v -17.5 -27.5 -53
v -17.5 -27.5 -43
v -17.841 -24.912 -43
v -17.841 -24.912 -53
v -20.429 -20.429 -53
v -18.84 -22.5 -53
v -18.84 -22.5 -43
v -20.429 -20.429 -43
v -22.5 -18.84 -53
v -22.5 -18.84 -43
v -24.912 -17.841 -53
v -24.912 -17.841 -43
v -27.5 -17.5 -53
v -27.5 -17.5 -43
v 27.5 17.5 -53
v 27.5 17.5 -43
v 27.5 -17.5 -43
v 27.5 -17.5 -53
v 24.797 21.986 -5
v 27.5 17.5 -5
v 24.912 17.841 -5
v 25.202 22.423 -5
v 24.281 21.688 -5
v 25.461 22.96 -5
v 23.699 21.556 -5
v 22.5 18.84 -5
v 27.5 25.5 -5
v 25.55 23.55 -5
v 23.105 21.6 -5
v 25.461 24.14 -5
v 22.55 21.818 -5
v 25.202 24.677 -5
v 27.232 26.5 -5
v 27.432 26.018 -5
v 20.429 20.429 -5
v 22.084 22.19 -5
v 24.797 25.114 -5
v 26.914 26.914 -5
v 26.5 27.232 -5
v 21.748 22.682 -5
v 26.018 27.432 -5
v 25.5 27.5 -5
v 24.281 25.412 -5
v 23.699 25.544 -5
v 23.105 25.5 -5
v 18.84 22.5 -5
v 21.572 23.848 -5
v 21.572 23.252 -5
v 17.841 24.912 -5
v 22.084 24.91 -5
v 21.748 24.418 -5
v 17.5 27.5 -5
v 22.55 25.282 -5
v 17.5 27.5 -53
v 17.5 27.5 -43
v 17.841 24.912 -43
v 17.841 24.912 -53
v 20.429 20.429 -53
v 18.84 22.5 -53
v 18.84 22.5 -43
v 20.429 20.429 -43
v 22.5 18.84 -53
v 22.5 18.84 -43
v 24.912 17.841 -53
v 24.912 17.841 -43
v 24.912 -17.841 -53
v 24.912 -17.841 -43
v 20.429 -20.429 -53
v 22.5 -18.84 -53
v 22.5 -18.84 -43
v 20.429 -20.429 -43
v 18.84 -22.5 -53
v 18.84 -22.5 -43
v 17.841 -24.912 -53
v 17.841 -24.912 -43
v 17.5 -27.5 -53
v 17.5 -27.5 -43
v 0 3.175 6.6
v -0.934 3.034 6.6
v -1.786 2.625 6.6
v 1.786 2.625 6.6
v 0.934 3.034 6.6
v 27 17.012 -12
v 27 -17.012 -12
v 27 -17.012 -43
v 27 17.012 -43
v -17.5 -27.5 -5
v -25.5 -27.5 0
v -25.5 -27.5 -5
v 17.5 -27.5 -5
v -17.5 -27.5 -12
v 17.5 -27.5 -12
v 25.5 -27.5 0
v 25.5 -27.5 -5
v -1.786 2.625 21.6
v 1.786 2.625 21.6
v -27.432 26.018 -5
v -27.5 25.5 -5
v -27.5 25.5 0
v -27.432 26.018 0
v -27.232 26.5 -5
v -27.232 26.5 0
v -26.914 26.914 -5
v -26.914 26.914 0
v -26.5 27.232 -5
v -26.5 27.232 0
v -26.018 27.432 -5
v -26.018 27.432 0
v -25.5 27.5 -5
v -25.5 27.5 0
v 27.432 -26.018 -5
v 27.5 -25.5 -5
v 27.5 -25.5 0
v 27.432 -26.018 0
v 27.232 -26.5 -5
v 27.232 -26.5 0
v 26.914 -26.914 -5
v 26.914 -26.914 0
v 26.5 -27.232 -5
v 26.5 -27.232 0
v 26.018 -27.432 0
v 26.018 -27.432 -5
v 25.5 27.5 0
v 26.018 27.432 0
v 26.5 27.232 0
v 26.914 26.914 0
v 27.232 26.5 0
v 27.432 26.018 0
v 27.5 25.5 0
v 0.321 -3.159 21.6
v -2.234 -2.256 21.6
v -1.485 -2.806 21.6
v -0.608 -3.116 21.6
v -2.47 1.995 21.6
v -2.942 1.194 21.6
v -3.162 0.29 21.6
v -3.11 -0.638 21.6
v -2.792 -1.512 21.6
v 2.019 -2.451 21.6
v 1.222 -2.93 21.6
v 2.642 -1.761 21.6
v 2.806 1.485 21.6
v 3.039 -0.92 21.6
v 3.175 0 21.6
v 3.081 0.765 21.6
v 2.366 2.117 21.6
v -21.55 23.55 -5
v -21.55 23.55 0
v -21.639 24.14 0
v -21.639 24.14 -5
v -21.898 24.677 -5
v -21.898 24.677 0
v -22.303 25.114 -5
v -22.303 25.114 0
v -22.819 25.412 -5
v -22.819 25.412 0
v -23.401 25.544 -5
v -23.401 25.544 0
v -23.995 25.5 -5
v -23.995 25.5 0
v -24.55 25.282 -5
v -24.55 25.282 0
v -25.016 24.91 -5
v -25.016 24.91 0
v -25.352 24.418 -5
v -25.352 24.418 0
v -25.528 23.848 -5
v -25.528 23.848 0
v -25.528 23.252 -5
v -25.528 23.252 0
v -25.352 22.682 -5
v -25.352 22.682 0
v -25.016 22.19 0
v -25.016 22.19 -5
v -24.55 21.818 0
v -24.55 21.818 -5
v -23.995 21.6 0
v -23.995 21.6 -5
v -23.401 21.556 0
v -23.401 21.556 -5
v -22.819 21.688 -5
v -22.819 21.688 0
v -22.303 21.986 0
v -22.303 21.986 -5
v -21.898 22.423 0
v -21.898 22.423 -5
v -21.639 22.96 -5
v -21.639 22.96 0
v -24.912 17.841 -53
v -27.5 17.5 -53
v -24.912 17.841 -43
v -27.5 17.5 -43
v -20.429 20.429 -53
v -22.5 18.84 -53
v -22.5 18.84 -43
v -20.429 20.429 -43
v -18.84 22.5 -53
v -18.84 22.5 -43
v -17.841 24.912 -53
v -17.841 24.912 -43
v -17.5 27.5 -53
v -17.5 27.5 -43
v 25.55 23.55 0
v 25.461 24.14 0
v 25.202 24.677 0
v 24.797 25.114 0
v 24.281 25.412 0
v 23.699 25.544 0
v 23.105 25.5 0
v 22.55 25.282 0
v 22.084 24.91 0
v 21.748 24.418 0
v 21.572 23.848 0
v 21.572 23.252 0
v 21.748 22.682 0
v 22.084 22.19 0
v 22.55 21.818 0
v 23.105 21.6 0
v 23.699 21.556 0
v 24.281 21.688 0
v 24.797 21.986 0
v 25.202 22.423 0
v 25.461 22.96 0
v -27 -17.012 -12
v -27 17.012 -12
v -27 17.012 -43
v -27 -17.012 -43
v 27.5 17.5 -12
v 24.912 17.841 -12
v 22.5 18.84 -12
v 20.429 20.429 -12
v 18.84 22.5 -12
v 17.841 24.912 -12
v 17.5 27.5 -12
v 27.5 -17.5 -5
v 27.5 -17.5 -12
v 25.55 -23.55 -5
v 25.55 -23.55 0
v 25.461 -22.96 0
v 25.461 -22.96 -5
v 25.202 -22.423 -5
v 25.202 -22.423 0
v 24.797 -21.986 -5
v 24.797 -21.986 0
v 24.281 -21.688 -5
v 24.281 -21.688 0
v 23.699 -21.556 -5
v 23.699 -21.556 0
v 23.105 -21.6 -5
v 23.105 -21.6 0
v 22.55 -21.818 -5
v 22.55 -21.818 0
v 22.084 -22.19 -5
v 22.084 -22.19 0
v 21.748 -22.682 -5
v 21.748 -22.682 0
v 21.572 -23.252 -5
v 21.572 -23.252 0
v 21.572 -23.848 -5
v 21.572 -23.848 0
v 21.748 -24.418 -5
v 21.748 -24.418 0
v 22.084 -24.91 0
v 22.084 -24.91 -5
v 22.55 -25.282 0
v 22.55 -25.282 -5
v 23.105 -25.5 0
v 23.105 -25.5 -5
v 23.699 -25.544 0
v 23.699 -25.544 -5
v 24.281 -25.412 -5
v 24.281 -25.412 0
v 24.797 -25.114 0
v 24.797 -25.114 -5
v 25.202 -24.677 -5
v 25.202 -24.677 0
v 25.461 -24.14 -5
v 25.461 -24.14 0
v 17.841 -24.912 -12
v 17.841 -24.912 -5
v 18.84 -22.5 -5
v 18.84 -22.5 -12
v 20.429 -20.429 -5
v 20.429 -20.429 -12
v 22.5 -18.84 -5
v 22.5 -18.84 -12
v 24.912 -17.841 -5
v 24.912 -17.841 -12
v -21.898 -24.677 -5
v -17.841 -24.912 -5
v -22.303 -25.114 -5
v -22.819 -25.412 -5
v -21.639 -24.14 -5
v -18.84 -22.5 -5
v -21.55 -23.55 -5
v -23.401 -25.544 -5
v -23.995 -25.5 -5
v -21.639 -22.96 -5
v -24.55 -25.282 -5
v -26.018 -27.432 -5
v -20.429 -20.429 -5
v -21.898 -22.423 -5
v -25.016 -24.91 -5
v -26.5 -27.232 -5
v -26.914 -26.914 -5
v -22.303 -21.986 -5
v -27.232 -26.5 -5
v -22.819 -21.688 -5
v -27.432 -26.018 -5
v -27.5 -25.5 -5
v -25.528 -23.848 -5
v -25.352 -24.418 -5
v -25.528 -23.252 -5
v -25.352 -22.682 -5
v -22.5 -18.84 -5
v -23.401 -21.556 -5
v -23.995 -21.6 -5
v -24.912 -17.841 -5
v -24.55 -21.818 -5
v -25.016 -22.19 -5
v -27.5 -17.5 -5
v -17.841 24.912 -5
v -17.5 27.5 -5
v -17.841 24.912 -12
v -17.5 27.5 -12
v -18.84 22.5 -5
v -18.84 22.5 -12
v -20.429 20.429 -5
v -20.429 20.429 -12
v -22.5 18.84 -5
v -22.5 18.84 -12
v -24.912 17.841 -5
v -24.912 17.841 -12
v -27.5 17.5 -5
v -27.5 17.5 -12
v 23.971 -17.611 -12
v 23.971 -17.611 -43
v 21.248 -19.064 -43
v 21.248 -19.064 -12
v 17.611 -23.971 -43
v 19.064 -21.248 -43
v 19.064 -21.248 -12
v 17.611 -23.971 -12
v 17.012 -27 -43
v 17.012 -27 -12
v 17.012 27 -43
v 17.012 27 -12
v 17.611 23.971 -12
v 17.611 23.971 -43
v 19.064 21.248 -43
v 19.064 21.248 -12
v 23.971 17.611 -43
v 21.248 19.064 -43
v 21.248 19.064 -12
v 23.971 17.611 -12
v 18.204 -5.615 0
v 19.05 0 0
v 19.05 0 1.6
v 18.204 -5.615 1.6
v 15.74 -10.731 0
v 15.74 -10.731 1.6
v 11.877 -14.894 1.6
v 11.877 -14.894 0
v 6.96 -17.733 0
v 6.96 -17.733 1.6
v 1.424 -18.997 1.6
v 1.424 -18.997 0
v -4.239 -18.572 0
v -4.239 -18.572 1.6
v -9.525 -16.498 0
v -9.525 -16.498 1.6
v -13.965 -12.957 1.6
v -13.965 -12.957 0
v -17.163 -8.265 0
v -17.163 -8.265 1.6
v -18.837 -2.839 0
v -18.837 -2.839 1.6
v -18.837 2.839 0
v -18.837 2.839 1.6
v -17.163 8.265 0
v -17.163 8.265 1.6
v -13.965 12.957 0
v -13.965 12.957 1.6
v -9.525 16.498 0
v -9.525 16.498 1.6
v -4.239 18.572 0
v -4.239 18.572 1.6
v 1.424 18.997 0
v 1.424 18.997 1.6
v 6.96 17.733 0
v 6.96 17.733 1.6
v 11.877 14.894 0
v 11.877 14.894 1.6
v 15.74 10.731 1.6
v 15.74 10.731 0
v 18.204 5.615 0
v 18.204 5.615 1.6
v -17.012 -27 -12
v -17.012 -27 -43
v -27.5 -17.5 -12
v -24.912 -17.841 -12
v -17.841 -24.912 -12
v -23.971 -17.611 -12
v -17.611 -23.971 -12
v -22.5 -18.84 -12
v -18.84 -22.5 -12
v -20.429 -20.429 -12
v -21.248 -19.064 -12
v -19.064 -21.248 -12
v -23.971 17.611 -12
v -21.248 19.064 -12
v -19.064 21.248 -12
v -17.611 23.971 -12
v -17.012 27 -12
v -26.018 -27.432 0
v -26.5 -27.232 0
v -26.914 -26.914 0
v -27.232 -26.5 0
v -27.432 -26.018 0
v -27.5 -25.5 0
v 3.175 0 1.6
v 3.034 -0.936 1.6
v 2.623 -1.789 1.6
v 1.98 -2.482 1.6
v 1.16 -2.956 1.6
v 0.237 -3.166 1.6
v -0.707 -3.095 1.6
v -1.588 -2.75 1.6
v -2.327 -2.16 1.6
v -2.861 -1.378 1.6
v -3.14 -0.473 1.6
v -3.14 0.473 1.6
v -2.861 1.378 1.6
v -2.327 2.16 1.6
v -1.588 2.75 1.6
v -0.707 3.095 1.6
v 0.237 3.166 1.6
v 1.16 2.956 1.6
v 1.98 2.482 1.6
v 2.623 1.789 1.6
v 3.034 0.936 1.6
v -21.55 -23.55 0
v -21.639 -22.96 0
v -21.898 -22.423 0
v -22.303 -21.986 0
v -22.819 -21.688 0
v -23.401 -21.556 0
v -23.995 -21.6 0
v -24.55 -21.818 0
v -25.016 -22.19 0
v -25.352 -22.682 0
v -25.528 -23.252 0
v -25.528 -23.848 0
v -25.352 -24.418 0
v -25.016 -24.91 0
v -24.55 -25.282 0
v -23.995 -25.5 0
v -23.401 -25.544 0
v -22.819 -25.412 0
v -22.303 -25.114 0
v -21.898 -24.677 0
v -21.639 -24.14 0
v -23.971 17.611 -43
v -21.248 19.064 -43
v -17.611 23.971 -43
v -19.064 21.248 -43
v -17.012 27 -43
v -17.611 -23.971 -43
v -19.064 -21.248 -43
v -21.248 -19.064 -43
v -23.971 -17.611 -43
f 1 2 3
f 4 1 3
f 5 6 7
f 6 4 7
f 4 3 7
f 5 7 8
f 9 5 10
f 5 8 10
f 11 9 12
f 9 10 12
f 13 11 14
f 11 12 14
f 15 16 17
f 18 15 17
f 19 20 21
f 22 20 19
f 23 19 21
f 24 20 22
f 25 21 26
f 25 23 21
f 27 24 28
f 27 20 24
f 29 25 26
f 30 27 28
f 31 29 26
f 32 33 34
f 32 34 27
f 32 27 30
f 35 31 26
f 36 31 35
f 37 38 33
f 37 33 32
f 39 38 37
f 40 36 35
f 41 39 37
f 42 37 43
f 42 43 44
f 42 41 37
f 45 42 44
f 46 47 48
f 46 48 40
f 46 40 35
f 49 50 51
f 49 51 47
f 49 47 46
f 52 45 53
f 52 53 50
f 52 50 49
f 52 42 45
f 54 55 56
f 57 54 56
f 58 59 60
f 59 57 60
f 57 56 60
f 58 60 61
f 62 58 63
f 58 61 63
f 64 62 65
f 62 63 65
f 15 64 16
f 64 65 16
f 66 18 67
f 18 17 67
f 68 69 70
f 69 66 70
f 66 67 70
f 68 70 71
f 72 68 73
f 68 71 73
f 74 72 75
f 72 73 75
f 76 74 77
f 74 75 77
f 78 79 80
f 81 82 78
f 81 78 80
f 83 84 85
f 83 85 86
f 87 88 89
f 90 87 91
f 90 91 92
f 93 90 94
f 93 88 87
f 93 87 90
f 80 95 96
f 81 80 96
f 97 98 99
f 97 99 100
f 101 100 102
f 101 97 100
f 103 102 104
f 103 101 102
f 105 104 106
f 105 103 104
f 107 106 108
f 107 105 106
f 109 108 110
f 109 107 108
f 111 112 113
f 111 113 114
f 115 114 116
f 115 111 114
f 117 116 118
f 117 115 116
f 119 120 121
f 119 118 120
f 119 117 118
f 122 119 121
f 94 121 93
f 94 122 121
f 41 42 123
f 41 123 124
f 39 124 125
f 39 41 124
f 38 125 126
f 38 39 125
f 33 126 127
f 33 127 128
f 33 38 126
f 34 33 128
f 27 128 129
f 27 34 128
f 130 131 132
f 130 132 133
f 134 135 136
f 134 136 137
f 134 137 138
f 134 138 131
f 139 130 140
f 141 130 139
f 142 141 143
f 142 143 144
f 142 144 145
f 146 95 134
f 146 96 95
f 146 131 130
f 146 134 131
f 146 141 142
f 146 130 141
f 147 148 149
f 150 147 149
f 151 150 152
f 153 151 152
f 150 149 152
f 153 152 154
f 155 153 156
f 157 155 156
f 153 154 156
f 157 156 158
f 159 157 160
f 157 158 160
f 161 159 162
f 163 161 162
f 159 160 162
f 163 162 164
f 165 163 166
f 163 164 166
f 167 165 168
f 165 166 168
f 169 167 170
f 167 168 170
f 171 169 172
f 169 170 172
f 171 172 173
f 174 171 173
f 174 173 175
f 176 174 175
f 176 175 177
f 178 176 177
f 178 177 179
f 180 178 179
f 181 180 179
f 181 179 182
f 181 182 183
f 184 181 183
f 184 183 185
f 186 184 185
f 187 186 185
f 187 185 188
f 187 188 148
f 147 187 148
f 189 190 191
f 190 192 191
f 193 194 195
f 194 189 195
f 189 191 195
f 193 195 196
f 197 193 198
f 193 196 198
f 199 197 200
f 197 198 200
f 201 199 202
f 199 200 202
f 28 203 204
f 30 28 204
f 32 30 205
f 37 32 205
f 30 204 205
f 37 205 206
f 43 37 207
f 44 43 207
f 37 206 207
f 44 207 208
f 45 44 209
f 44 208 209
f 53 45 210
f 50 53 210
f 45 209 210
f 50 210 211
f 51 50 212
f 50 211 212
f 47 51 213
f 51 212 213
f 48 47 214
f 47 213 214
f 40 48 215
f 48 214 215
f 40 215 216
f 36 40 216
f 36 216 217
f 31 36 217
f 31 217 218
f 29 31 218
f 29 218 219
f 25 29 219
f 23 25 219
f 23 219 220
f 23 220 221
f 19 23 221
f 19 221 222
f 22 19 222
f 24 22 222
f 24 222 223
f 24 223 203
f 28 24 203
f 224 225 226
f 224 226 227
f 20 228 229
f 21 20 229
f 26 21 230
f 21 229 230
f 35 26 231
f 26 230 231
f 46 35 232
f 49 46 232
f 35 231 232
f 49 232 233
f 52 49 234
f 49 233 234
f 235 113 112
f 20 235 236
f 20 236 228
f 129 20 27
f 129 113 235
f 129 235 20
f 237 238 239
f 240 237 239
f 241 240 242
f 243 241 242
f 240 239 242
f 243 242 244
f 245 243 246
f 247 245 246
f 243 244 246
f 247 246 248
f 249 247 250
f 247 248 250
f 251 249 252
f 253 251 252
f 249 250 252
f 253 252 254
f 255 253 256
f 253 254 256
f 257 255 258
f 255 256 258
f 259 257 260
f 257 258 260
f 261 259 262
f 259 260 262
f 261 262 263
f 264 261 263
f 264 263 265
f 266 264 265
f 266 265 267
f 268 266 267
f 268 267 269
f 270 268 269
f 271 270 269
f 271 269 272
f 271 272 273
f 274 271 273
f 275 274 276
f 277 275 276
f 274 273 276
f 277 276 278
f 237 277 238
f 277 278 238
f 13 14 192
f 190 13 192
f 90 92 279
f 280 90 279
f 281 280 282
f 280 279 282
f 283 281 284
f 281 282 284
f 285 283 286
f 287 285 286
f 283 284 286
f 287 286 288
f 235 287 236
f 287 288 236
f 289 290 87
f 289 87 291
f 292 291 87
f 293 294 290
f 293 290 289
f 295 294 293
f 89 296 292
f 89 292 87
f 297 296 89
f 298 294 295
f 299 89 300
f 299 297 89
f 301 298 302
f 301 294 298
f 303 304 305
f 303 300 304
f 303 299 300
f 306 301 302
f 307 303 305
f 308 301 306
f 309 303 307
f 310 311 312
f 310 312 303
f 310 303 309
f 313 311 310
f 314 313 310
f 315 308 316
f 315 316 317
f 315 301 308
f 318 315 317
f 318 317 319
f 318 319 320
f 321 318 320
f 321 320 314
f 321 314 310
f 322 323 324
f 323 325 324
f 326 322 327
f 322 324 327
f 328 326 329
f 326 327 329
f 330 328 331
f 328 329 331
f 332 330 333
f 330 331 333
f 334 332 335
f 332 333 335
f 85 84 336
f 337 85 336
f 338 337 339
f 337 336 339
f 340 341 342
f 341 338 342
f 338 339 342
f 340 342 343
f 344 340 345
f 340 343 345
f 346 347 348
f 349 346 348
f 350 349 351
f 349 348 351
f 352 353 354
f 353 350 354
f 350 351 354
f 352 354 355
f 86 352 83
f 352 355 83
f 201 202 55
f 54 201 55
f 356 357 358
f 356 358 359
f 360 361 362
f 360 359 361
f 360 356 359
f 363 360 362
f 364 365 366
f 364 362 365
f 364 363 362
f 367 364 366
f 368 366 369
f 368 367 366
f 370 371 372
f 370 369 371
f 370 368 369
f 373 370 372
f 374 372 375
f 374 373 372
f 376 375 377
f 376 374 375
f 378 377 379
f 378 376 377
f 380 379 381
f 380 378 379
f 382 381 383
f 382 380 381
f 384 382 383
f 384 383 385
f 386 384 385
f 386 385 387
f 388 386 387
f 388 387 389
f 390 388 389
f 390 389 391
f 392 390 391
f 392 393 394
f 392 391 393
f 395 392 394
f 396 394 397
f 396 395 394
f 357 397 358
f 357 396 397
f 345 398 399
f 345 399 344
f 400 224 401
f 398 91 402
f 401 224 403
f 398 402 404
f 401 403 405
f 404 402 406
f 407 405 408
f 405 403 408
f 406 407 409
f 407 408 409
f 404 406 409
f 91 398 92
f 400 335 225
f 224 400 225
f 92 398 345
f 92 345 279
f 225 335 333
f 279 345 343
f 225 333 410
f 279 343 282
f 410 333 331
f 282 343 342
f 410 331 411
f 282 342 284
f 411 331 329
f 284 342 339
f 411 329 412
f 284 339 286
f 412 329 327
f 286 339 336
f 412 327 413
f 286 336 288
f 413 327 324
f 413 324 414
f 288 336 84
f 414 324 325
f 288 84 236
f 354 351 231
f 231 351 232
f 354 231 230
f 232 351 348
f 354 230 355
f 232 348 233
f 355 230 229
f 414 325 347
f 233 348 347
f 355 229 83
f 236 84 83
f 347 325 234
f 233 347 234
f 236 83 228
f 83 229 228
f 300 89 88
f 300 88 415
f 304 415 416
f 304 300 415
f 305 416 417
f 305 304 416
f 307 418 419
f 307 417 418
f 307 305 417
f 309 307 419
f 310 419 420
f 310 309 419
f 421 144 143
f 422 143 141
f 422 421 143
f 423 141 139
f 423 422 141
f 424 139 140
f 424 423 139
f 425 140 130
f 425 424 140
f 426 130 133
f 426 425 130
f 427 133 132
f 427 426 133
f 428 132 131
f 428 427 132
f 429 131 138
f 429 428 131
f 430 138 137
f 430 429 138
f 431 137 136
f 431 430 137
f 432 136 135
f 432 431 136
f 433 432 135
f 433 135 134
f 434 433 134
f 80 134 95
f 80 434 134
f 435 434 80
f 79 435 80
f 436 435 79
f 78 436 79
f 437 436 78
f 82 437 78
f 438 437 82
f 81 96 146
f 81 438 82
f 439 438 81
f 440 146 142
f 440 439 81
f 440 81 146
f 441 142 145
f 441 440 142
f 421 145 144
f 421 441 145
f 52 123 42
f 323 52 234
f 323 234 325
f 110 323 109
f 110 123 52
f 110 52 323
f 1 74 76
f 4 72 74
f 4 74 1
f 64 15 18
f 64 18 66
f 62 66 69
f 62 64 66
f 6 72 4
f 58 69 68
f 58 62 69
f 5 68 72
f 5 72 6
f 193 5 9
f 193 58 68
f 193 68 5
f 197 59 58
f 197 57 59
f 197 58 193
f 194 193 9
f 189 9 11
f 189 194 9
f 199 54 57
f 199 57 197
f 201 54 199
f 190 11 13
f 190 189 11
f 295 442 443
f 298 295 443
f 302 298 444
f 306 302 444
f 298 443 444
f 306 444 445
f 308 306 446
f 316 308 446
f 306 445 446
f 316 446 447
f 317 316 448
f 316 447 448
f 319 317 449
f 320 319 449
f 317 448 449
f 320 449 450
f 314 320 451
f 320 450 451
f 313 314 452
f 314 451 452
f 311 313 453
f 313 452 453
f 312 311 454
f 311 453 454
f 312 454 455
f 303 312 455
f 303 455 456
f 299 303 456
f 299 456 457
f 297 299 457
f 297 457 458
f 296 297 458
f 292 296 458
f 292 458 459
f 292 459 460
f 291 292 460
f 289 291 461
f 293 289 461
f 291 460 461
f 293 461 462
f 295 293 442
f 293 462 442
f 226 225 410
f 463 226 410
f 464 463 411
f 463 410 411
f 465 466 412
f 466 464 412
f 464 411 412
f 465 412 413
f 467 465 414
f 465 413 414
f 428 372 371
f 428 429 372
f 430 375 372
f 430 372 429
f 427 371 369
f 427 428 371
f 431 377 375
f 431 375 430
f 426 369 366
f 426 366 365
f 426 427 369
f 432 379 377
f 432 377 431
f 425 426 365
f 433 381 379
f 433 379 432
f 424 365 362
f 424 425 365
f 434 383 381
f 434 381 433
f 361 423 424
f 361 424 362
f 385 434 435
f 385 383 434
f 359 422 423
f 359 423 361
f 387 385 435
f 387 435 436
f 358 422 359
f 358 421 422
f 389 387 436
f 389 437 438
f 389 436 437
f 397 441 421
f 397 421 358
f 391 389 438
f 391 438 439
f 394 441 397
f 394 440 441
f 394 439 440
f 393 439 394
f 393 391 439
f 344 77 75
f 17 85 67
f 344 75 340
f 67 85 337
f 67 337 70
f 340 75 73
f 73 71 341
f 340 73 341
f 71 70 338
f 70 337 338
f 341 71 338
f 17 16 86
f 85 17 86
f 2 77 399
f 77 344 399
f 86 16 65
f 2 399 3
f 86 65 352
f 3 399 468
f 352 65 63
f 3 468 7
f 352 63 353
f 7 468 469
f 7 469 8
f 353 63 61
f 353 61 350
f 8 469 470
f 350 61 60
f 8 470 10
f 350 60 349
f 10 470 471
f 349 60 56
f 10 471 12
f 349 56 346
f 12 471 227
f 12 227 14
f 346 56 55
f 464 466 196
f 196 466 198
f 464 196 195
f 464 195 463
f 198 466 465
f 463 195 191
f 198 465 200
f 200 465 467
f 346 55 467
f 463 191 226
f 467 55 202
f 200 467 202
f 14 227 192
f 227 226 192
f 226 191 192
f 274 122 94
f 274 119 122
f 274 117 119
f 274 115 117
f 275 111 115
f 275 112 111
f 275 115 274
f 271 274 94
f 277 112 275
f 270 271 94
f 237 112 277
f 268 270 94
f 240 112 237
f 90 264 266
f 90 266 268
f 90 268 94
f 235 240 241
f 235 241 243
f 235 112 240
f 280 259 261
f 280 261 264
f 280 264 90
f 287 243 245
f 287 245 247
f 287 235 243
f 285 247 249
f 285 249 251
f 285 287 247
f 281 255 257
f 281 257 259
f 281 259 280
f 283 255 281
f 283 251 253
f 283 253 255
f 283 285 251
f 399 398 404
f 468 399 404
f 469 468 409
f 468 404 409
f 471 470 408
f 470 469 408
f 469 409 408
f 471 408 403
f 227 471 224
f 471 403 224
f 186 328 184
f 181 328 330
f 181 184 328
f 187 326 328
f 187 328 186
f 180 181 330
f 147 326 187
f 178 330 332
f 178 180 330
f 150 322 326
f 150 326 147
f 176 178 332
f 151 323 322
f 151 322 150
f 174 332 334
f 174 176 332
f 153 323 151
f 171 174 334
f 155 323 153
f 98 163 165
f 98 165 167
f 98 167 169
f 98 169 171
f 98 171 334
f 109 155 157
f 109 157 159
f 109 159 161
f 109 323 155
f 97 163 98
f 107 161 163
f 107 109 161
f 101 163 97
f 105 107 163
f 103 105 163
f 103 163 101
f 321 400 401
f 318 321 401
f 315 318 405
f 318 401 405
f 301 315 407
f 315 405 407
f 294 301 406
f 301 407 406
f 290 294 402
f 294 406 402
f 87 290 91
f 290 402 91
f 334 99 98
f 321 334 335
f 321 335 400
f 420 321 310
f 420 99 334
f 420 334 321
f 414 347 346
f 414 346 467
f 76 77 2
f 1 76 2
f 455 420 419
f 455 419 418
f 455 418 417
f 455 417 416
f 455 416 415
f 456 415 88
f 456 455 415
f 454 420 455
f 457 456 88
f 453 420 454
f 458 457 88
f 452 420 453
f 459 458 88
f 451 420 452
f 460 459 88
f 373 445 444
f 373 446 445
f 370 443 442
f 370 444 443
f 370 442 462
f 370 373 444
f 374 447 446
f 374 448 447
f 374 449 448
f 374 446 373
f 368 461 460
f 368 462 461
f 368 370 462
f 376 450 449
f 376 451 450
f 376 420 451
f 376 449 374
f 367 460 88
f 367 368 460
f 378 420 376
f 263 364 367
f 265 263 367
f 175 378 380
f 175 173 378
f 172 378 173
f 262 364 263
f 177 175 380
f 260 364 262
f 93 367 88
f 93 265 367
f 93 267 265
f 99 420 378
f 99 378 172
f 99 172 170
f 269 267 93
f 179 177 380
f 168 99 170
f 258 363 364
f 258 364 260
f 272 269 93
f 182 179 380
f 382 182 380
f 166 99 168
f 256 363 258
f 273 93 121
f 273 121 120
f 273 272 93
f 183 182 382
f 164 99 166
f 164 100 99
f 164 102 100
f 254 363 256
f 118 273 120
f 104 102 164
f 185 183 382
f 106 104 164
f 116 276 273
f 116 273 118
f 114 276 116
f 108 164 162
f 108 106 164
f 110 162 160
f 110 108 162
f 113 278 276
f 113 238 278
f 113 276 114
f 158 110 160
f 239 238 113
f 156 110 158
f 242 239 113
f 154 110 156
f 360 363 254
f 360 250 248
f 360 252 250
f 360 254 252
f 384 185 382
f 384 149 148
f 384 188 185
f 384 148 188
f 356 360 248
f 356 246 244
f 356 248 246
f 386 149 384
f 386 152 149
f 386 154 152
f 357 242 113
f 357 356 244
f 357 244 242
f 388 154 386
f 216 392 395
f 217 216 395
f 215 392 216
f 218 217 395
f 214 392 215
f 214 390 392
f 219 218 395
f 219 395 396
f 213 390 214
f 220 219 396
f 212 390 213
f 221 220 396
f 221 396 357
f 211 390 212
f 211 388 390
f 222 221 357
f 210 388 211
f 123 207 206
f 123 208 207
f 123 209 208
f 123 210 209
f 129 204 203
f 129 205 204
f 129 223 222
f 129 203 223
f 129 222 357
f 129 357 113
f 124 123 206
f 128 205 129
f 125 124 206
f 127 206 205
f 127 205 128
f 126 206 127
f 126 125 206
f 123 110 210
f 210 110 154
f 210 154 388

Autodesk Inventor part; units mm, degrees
ref_plane "YZ Plane" through (0, 0, 0) normal (1, 0, 0) x (0, 1, 0)
ref_plane "XZ Plane" through (0, 0, 0) normal (0, 1, 0) x (-1, 0, 0)
ref_plane "XY Plane" through (0, 0, 0) normal (0, 0, 1) x (1, 0, 0)
sketch "Skizze1" plane through (0, 0, 0) normal (0, 0, 1) x (1, 0, 0)
  line L0 (-27.5, -27.5) -> (27.5, -27.5)
  line L1 (27.5, -27.5) -> (27.5, 27.5)
  line L2 (27.5, 27.5) -> (-27.5, 27.5)
  line L3 (-27.5, 27.5) -> (-27.5, -27.5)
  line L4 (-27.5, -27.5) -> (27.5, 27.5) construction
  line L5 (27.5, -27.5) -> (-27.5, 27.5) construction
  point P0 (0, 0)
  dimension "d0" = 55
  dimension "d1" = 55
extrude "Extrusion1" add sketch "Skizze1" against normal blind 12
sketch "Skizze2" plane through (0, 0, -12) normal (0, 0, -1) x (-1, 0, 0)
  line L0 (27.5, 27.5) -> (-27.5, 27.5) projected
  circle A0 centre (-27.5, 27.5) radius 10
  line L1 (27.5, -27.5) -> (27.5, 27.5) projected
  circle A1 centre (27.5, 27.5) radius 10
  circle A2 centre (27.5, -27.5) radius 10
  circle A3 centre (-27.5, -27.5) radius 10
  point P0 (0, 0)
  dimension "d4" = 20
extrude "Extrusion2" cut sketch "Skizze2" against normal blind 7
sketch "Skizze3" plane through (0, 0, -12) normal (0, 0, -1) x (-1, 0, 0)
  arc A0 (27.5, -17.5) -> (17.5, -27.5) centre (27.5, -27.5) ccw projected
  line L0 (27.5, -17.5) -> (27.5, 17.5) projected
  arc A1 (17.5, 27.5) -> (27.5, 17.5) centre (27.5, 27.5) ccw projected
  line L1 (17.5, 27.5) -> (-17.5, 27.5) projected
  arc A2 (-27.5, 17.5) -> (-17.5, 27.5) centre (-27.5, 27.5) ccw projected
  line L2 (-27.5, 17.5) -> (-27.5, -17.5) projected
  arc A3 (-17.5, -27.5) -> (-27.5, -17.5) centre (-27.5, -27.5) ccw projected
  line L3 (-17.5, -27.5) -> (17.5, -27.5) projected
  line L4 (-17.0119, 27) -> (17.0119, 27)
  arc A4 (17.0119, 27) -> (27, 17.0119) centre (27.5, 27.5) ccw
  line L5 (27, 17.0119) -> (27, -17.0119)
  arc A5 (27, -17.0119) -> (17.0119, -27) centre (27.5, -27.5) ccw
  line L6 (17.0119, -27) -> (-17.0119, -27)
  arc A6 (-17.0119, -27) -> (-27, -17.0119) centre (-27.5, -27.5) ccw
  line L7 (-27, -17.0119) -> (-27, 17.0119)
  arc A7 (-27, 17.0119) -> (-17.0119, 27) centre (-27.5, 27.5) ccw
  point P0 (0, 0)
  dimension "d7" = 0.5
extrude "Extrusion3" add sketch "Skizze3" along normal blind 31 contours L4 A4 L5 A5 L6 A6 L7 A7
sketch "Skizze4" plane through (0, 0, -43) normal (0, 0, -1) x (-1, 0, 0)
  arc A0 (17.0119, 27) -> (27, 17.0119) centre (27.5, 27.5) ccw projected
  line L0 (27, 17.0119) -> (27, -17.0119) projected
  arc A1 (27, -17.0119) -> (17.0119, -27) centre (27.5, -27.5) ccw projected
  line L1 (17.0119, -27) -> (-17.0119, -27) projected
  arc A2 (-17.0119, -27) -> (-27, -17.0119) centre (-27.5, -27.5) ccw projected
  line L2 (-27, -17.0119) -> (-27, 17.0119) projected
  arc A3 (-27, 17.0119) -> (-17.0119, 27) centre (-27.5, 27.5) ccw projected
  line L3 (-17.0119, 27) -> (17.0119, 27) projected
  arc A4 (27.5, -17.5) -> (17.5, -27.5) centre (27.5, -27.5) ccw projected
  line L4 (27.5, -17.5) -> (27.5, 17.5) projected
  arc A5 (17.5, 27.5) -> (27.5, 17.5) centre (27.5, 27.5) ccw projected
  line L5 (17.5, 27.5) -> (-17.5, 27.5) projected
  arc A6 (-27.5, 17.5) -> (-17.5, 27.5) centre (-27.5, 27.5) ccw projected
  line L6 (-27.5, 17.5) -> (-27.5, -17.5) projected
  arc A7 (-17.5, -27.5) -> (-27.5, -17.5) centre (-27.5, -27.5) ccw projected
  line L7 (-17.5, -27.5) -> (17.5, -27.5) projected
  point P0 (0, 0)
extrude "Extrusion4" add sketch "Skizze4" along normal blind 10 contours A0 L0 A1 L1 A2 L2 A3 L3 | A4 L7 A7 L6 A6 L5 A5 L4
sketch "Skizze6" plane through (0, 0, 0) normal (0, 0, 1) x (1, 0, 0)
  line L0 (-23.55, -23.55) -> (23.55, -23.55)
  line L1 (23.55, -23.55) -> (23.55, 23.55)
  line L2 (23.55, 23.55) -> (-23.55, 23.55)
  line L3 (-23.55, 23.55) -> (-23.55, -23.55)
  line L4 (-23.55, -23.55) -> (23.55, 23.55) construction
  line L5 (23.55, -23.55) -> (-23.55, 23.55) construction
  circle A0 centre (-23.55, 23.55) radius 2
  circle A1 centre (23.55, 23.55) radius 2
  circle A2 centre (23.55, -23.55) radius 2
  circle A3 centre (-23.55, -23.55) radius 2
  point P0 (0, 0)
  dimension "d12" = 4
  dimension "d13" = 47.1
  dimension "d14" = 47.1
extrude "Extrusion5" cut sketch "Skizze6" along normal through all both and the other way through all contours L3 A3 L0 | L0 A3 L3 | A2 L1 L0 | L0 L1 A2 | A0 L2 L3 | L3 L2 A0 | A1 L2 L1 | L1 L2 A1
fillet "Rundung1" radius 2 4 edges at (27.5, 27.5, -2.5) (-27.5, 27.5, -2.5) (27.5, -27.5, -2.5) (-27.5, -27.5, -2.5)
sketch "Skizze7" plane through (0, 0, 0) normal (0, 0, 1) x (1, 0, 0)
  circle A0 centre (0, 0) radius 19.05
  dimension "d18" = 38.1
extrude "Extrusion6" add sketch "Skizze7" along normal blind 1.6
sketch "Skizze8" plane through (0, 0, 1.6) normal (0, 0, 1) x (1, 0, 0)
  circle A0 centre (0, 0) radius 3.175
  dimension "d21" = 6.35
extrude "Extrusion7" add sketch "Skizze8" along normal blind 20
sketch "Skizze9" plane through (0, 0, 21.6) normal (0, 0, 1) x (1, 0, 0)
  line L0 (-1.7861, 2.625) -> (1.7861, 2.625)
  line L1 (1.7861, 2.625) -> (1.7861, 3.175)
  line L2 (1.7861, 3.175) -> (-1.7861, 3.175)
  line L3 (-1.7861, 3.175) -> (-1.7861, 2.625)
  circle A0 centre (0, 0) radius 3.175 projected
  point P0 (0, 3.175)
  dimension "d29" = 5.8
extrude "Extrusion8" cut sketch "Skizze9" against normal blind 15 contours A0 L0 | L3 L2 A0 | A0 L2 L1 picked at (-0.4105, 2.7255)
properties part number "MC18_Motor"
